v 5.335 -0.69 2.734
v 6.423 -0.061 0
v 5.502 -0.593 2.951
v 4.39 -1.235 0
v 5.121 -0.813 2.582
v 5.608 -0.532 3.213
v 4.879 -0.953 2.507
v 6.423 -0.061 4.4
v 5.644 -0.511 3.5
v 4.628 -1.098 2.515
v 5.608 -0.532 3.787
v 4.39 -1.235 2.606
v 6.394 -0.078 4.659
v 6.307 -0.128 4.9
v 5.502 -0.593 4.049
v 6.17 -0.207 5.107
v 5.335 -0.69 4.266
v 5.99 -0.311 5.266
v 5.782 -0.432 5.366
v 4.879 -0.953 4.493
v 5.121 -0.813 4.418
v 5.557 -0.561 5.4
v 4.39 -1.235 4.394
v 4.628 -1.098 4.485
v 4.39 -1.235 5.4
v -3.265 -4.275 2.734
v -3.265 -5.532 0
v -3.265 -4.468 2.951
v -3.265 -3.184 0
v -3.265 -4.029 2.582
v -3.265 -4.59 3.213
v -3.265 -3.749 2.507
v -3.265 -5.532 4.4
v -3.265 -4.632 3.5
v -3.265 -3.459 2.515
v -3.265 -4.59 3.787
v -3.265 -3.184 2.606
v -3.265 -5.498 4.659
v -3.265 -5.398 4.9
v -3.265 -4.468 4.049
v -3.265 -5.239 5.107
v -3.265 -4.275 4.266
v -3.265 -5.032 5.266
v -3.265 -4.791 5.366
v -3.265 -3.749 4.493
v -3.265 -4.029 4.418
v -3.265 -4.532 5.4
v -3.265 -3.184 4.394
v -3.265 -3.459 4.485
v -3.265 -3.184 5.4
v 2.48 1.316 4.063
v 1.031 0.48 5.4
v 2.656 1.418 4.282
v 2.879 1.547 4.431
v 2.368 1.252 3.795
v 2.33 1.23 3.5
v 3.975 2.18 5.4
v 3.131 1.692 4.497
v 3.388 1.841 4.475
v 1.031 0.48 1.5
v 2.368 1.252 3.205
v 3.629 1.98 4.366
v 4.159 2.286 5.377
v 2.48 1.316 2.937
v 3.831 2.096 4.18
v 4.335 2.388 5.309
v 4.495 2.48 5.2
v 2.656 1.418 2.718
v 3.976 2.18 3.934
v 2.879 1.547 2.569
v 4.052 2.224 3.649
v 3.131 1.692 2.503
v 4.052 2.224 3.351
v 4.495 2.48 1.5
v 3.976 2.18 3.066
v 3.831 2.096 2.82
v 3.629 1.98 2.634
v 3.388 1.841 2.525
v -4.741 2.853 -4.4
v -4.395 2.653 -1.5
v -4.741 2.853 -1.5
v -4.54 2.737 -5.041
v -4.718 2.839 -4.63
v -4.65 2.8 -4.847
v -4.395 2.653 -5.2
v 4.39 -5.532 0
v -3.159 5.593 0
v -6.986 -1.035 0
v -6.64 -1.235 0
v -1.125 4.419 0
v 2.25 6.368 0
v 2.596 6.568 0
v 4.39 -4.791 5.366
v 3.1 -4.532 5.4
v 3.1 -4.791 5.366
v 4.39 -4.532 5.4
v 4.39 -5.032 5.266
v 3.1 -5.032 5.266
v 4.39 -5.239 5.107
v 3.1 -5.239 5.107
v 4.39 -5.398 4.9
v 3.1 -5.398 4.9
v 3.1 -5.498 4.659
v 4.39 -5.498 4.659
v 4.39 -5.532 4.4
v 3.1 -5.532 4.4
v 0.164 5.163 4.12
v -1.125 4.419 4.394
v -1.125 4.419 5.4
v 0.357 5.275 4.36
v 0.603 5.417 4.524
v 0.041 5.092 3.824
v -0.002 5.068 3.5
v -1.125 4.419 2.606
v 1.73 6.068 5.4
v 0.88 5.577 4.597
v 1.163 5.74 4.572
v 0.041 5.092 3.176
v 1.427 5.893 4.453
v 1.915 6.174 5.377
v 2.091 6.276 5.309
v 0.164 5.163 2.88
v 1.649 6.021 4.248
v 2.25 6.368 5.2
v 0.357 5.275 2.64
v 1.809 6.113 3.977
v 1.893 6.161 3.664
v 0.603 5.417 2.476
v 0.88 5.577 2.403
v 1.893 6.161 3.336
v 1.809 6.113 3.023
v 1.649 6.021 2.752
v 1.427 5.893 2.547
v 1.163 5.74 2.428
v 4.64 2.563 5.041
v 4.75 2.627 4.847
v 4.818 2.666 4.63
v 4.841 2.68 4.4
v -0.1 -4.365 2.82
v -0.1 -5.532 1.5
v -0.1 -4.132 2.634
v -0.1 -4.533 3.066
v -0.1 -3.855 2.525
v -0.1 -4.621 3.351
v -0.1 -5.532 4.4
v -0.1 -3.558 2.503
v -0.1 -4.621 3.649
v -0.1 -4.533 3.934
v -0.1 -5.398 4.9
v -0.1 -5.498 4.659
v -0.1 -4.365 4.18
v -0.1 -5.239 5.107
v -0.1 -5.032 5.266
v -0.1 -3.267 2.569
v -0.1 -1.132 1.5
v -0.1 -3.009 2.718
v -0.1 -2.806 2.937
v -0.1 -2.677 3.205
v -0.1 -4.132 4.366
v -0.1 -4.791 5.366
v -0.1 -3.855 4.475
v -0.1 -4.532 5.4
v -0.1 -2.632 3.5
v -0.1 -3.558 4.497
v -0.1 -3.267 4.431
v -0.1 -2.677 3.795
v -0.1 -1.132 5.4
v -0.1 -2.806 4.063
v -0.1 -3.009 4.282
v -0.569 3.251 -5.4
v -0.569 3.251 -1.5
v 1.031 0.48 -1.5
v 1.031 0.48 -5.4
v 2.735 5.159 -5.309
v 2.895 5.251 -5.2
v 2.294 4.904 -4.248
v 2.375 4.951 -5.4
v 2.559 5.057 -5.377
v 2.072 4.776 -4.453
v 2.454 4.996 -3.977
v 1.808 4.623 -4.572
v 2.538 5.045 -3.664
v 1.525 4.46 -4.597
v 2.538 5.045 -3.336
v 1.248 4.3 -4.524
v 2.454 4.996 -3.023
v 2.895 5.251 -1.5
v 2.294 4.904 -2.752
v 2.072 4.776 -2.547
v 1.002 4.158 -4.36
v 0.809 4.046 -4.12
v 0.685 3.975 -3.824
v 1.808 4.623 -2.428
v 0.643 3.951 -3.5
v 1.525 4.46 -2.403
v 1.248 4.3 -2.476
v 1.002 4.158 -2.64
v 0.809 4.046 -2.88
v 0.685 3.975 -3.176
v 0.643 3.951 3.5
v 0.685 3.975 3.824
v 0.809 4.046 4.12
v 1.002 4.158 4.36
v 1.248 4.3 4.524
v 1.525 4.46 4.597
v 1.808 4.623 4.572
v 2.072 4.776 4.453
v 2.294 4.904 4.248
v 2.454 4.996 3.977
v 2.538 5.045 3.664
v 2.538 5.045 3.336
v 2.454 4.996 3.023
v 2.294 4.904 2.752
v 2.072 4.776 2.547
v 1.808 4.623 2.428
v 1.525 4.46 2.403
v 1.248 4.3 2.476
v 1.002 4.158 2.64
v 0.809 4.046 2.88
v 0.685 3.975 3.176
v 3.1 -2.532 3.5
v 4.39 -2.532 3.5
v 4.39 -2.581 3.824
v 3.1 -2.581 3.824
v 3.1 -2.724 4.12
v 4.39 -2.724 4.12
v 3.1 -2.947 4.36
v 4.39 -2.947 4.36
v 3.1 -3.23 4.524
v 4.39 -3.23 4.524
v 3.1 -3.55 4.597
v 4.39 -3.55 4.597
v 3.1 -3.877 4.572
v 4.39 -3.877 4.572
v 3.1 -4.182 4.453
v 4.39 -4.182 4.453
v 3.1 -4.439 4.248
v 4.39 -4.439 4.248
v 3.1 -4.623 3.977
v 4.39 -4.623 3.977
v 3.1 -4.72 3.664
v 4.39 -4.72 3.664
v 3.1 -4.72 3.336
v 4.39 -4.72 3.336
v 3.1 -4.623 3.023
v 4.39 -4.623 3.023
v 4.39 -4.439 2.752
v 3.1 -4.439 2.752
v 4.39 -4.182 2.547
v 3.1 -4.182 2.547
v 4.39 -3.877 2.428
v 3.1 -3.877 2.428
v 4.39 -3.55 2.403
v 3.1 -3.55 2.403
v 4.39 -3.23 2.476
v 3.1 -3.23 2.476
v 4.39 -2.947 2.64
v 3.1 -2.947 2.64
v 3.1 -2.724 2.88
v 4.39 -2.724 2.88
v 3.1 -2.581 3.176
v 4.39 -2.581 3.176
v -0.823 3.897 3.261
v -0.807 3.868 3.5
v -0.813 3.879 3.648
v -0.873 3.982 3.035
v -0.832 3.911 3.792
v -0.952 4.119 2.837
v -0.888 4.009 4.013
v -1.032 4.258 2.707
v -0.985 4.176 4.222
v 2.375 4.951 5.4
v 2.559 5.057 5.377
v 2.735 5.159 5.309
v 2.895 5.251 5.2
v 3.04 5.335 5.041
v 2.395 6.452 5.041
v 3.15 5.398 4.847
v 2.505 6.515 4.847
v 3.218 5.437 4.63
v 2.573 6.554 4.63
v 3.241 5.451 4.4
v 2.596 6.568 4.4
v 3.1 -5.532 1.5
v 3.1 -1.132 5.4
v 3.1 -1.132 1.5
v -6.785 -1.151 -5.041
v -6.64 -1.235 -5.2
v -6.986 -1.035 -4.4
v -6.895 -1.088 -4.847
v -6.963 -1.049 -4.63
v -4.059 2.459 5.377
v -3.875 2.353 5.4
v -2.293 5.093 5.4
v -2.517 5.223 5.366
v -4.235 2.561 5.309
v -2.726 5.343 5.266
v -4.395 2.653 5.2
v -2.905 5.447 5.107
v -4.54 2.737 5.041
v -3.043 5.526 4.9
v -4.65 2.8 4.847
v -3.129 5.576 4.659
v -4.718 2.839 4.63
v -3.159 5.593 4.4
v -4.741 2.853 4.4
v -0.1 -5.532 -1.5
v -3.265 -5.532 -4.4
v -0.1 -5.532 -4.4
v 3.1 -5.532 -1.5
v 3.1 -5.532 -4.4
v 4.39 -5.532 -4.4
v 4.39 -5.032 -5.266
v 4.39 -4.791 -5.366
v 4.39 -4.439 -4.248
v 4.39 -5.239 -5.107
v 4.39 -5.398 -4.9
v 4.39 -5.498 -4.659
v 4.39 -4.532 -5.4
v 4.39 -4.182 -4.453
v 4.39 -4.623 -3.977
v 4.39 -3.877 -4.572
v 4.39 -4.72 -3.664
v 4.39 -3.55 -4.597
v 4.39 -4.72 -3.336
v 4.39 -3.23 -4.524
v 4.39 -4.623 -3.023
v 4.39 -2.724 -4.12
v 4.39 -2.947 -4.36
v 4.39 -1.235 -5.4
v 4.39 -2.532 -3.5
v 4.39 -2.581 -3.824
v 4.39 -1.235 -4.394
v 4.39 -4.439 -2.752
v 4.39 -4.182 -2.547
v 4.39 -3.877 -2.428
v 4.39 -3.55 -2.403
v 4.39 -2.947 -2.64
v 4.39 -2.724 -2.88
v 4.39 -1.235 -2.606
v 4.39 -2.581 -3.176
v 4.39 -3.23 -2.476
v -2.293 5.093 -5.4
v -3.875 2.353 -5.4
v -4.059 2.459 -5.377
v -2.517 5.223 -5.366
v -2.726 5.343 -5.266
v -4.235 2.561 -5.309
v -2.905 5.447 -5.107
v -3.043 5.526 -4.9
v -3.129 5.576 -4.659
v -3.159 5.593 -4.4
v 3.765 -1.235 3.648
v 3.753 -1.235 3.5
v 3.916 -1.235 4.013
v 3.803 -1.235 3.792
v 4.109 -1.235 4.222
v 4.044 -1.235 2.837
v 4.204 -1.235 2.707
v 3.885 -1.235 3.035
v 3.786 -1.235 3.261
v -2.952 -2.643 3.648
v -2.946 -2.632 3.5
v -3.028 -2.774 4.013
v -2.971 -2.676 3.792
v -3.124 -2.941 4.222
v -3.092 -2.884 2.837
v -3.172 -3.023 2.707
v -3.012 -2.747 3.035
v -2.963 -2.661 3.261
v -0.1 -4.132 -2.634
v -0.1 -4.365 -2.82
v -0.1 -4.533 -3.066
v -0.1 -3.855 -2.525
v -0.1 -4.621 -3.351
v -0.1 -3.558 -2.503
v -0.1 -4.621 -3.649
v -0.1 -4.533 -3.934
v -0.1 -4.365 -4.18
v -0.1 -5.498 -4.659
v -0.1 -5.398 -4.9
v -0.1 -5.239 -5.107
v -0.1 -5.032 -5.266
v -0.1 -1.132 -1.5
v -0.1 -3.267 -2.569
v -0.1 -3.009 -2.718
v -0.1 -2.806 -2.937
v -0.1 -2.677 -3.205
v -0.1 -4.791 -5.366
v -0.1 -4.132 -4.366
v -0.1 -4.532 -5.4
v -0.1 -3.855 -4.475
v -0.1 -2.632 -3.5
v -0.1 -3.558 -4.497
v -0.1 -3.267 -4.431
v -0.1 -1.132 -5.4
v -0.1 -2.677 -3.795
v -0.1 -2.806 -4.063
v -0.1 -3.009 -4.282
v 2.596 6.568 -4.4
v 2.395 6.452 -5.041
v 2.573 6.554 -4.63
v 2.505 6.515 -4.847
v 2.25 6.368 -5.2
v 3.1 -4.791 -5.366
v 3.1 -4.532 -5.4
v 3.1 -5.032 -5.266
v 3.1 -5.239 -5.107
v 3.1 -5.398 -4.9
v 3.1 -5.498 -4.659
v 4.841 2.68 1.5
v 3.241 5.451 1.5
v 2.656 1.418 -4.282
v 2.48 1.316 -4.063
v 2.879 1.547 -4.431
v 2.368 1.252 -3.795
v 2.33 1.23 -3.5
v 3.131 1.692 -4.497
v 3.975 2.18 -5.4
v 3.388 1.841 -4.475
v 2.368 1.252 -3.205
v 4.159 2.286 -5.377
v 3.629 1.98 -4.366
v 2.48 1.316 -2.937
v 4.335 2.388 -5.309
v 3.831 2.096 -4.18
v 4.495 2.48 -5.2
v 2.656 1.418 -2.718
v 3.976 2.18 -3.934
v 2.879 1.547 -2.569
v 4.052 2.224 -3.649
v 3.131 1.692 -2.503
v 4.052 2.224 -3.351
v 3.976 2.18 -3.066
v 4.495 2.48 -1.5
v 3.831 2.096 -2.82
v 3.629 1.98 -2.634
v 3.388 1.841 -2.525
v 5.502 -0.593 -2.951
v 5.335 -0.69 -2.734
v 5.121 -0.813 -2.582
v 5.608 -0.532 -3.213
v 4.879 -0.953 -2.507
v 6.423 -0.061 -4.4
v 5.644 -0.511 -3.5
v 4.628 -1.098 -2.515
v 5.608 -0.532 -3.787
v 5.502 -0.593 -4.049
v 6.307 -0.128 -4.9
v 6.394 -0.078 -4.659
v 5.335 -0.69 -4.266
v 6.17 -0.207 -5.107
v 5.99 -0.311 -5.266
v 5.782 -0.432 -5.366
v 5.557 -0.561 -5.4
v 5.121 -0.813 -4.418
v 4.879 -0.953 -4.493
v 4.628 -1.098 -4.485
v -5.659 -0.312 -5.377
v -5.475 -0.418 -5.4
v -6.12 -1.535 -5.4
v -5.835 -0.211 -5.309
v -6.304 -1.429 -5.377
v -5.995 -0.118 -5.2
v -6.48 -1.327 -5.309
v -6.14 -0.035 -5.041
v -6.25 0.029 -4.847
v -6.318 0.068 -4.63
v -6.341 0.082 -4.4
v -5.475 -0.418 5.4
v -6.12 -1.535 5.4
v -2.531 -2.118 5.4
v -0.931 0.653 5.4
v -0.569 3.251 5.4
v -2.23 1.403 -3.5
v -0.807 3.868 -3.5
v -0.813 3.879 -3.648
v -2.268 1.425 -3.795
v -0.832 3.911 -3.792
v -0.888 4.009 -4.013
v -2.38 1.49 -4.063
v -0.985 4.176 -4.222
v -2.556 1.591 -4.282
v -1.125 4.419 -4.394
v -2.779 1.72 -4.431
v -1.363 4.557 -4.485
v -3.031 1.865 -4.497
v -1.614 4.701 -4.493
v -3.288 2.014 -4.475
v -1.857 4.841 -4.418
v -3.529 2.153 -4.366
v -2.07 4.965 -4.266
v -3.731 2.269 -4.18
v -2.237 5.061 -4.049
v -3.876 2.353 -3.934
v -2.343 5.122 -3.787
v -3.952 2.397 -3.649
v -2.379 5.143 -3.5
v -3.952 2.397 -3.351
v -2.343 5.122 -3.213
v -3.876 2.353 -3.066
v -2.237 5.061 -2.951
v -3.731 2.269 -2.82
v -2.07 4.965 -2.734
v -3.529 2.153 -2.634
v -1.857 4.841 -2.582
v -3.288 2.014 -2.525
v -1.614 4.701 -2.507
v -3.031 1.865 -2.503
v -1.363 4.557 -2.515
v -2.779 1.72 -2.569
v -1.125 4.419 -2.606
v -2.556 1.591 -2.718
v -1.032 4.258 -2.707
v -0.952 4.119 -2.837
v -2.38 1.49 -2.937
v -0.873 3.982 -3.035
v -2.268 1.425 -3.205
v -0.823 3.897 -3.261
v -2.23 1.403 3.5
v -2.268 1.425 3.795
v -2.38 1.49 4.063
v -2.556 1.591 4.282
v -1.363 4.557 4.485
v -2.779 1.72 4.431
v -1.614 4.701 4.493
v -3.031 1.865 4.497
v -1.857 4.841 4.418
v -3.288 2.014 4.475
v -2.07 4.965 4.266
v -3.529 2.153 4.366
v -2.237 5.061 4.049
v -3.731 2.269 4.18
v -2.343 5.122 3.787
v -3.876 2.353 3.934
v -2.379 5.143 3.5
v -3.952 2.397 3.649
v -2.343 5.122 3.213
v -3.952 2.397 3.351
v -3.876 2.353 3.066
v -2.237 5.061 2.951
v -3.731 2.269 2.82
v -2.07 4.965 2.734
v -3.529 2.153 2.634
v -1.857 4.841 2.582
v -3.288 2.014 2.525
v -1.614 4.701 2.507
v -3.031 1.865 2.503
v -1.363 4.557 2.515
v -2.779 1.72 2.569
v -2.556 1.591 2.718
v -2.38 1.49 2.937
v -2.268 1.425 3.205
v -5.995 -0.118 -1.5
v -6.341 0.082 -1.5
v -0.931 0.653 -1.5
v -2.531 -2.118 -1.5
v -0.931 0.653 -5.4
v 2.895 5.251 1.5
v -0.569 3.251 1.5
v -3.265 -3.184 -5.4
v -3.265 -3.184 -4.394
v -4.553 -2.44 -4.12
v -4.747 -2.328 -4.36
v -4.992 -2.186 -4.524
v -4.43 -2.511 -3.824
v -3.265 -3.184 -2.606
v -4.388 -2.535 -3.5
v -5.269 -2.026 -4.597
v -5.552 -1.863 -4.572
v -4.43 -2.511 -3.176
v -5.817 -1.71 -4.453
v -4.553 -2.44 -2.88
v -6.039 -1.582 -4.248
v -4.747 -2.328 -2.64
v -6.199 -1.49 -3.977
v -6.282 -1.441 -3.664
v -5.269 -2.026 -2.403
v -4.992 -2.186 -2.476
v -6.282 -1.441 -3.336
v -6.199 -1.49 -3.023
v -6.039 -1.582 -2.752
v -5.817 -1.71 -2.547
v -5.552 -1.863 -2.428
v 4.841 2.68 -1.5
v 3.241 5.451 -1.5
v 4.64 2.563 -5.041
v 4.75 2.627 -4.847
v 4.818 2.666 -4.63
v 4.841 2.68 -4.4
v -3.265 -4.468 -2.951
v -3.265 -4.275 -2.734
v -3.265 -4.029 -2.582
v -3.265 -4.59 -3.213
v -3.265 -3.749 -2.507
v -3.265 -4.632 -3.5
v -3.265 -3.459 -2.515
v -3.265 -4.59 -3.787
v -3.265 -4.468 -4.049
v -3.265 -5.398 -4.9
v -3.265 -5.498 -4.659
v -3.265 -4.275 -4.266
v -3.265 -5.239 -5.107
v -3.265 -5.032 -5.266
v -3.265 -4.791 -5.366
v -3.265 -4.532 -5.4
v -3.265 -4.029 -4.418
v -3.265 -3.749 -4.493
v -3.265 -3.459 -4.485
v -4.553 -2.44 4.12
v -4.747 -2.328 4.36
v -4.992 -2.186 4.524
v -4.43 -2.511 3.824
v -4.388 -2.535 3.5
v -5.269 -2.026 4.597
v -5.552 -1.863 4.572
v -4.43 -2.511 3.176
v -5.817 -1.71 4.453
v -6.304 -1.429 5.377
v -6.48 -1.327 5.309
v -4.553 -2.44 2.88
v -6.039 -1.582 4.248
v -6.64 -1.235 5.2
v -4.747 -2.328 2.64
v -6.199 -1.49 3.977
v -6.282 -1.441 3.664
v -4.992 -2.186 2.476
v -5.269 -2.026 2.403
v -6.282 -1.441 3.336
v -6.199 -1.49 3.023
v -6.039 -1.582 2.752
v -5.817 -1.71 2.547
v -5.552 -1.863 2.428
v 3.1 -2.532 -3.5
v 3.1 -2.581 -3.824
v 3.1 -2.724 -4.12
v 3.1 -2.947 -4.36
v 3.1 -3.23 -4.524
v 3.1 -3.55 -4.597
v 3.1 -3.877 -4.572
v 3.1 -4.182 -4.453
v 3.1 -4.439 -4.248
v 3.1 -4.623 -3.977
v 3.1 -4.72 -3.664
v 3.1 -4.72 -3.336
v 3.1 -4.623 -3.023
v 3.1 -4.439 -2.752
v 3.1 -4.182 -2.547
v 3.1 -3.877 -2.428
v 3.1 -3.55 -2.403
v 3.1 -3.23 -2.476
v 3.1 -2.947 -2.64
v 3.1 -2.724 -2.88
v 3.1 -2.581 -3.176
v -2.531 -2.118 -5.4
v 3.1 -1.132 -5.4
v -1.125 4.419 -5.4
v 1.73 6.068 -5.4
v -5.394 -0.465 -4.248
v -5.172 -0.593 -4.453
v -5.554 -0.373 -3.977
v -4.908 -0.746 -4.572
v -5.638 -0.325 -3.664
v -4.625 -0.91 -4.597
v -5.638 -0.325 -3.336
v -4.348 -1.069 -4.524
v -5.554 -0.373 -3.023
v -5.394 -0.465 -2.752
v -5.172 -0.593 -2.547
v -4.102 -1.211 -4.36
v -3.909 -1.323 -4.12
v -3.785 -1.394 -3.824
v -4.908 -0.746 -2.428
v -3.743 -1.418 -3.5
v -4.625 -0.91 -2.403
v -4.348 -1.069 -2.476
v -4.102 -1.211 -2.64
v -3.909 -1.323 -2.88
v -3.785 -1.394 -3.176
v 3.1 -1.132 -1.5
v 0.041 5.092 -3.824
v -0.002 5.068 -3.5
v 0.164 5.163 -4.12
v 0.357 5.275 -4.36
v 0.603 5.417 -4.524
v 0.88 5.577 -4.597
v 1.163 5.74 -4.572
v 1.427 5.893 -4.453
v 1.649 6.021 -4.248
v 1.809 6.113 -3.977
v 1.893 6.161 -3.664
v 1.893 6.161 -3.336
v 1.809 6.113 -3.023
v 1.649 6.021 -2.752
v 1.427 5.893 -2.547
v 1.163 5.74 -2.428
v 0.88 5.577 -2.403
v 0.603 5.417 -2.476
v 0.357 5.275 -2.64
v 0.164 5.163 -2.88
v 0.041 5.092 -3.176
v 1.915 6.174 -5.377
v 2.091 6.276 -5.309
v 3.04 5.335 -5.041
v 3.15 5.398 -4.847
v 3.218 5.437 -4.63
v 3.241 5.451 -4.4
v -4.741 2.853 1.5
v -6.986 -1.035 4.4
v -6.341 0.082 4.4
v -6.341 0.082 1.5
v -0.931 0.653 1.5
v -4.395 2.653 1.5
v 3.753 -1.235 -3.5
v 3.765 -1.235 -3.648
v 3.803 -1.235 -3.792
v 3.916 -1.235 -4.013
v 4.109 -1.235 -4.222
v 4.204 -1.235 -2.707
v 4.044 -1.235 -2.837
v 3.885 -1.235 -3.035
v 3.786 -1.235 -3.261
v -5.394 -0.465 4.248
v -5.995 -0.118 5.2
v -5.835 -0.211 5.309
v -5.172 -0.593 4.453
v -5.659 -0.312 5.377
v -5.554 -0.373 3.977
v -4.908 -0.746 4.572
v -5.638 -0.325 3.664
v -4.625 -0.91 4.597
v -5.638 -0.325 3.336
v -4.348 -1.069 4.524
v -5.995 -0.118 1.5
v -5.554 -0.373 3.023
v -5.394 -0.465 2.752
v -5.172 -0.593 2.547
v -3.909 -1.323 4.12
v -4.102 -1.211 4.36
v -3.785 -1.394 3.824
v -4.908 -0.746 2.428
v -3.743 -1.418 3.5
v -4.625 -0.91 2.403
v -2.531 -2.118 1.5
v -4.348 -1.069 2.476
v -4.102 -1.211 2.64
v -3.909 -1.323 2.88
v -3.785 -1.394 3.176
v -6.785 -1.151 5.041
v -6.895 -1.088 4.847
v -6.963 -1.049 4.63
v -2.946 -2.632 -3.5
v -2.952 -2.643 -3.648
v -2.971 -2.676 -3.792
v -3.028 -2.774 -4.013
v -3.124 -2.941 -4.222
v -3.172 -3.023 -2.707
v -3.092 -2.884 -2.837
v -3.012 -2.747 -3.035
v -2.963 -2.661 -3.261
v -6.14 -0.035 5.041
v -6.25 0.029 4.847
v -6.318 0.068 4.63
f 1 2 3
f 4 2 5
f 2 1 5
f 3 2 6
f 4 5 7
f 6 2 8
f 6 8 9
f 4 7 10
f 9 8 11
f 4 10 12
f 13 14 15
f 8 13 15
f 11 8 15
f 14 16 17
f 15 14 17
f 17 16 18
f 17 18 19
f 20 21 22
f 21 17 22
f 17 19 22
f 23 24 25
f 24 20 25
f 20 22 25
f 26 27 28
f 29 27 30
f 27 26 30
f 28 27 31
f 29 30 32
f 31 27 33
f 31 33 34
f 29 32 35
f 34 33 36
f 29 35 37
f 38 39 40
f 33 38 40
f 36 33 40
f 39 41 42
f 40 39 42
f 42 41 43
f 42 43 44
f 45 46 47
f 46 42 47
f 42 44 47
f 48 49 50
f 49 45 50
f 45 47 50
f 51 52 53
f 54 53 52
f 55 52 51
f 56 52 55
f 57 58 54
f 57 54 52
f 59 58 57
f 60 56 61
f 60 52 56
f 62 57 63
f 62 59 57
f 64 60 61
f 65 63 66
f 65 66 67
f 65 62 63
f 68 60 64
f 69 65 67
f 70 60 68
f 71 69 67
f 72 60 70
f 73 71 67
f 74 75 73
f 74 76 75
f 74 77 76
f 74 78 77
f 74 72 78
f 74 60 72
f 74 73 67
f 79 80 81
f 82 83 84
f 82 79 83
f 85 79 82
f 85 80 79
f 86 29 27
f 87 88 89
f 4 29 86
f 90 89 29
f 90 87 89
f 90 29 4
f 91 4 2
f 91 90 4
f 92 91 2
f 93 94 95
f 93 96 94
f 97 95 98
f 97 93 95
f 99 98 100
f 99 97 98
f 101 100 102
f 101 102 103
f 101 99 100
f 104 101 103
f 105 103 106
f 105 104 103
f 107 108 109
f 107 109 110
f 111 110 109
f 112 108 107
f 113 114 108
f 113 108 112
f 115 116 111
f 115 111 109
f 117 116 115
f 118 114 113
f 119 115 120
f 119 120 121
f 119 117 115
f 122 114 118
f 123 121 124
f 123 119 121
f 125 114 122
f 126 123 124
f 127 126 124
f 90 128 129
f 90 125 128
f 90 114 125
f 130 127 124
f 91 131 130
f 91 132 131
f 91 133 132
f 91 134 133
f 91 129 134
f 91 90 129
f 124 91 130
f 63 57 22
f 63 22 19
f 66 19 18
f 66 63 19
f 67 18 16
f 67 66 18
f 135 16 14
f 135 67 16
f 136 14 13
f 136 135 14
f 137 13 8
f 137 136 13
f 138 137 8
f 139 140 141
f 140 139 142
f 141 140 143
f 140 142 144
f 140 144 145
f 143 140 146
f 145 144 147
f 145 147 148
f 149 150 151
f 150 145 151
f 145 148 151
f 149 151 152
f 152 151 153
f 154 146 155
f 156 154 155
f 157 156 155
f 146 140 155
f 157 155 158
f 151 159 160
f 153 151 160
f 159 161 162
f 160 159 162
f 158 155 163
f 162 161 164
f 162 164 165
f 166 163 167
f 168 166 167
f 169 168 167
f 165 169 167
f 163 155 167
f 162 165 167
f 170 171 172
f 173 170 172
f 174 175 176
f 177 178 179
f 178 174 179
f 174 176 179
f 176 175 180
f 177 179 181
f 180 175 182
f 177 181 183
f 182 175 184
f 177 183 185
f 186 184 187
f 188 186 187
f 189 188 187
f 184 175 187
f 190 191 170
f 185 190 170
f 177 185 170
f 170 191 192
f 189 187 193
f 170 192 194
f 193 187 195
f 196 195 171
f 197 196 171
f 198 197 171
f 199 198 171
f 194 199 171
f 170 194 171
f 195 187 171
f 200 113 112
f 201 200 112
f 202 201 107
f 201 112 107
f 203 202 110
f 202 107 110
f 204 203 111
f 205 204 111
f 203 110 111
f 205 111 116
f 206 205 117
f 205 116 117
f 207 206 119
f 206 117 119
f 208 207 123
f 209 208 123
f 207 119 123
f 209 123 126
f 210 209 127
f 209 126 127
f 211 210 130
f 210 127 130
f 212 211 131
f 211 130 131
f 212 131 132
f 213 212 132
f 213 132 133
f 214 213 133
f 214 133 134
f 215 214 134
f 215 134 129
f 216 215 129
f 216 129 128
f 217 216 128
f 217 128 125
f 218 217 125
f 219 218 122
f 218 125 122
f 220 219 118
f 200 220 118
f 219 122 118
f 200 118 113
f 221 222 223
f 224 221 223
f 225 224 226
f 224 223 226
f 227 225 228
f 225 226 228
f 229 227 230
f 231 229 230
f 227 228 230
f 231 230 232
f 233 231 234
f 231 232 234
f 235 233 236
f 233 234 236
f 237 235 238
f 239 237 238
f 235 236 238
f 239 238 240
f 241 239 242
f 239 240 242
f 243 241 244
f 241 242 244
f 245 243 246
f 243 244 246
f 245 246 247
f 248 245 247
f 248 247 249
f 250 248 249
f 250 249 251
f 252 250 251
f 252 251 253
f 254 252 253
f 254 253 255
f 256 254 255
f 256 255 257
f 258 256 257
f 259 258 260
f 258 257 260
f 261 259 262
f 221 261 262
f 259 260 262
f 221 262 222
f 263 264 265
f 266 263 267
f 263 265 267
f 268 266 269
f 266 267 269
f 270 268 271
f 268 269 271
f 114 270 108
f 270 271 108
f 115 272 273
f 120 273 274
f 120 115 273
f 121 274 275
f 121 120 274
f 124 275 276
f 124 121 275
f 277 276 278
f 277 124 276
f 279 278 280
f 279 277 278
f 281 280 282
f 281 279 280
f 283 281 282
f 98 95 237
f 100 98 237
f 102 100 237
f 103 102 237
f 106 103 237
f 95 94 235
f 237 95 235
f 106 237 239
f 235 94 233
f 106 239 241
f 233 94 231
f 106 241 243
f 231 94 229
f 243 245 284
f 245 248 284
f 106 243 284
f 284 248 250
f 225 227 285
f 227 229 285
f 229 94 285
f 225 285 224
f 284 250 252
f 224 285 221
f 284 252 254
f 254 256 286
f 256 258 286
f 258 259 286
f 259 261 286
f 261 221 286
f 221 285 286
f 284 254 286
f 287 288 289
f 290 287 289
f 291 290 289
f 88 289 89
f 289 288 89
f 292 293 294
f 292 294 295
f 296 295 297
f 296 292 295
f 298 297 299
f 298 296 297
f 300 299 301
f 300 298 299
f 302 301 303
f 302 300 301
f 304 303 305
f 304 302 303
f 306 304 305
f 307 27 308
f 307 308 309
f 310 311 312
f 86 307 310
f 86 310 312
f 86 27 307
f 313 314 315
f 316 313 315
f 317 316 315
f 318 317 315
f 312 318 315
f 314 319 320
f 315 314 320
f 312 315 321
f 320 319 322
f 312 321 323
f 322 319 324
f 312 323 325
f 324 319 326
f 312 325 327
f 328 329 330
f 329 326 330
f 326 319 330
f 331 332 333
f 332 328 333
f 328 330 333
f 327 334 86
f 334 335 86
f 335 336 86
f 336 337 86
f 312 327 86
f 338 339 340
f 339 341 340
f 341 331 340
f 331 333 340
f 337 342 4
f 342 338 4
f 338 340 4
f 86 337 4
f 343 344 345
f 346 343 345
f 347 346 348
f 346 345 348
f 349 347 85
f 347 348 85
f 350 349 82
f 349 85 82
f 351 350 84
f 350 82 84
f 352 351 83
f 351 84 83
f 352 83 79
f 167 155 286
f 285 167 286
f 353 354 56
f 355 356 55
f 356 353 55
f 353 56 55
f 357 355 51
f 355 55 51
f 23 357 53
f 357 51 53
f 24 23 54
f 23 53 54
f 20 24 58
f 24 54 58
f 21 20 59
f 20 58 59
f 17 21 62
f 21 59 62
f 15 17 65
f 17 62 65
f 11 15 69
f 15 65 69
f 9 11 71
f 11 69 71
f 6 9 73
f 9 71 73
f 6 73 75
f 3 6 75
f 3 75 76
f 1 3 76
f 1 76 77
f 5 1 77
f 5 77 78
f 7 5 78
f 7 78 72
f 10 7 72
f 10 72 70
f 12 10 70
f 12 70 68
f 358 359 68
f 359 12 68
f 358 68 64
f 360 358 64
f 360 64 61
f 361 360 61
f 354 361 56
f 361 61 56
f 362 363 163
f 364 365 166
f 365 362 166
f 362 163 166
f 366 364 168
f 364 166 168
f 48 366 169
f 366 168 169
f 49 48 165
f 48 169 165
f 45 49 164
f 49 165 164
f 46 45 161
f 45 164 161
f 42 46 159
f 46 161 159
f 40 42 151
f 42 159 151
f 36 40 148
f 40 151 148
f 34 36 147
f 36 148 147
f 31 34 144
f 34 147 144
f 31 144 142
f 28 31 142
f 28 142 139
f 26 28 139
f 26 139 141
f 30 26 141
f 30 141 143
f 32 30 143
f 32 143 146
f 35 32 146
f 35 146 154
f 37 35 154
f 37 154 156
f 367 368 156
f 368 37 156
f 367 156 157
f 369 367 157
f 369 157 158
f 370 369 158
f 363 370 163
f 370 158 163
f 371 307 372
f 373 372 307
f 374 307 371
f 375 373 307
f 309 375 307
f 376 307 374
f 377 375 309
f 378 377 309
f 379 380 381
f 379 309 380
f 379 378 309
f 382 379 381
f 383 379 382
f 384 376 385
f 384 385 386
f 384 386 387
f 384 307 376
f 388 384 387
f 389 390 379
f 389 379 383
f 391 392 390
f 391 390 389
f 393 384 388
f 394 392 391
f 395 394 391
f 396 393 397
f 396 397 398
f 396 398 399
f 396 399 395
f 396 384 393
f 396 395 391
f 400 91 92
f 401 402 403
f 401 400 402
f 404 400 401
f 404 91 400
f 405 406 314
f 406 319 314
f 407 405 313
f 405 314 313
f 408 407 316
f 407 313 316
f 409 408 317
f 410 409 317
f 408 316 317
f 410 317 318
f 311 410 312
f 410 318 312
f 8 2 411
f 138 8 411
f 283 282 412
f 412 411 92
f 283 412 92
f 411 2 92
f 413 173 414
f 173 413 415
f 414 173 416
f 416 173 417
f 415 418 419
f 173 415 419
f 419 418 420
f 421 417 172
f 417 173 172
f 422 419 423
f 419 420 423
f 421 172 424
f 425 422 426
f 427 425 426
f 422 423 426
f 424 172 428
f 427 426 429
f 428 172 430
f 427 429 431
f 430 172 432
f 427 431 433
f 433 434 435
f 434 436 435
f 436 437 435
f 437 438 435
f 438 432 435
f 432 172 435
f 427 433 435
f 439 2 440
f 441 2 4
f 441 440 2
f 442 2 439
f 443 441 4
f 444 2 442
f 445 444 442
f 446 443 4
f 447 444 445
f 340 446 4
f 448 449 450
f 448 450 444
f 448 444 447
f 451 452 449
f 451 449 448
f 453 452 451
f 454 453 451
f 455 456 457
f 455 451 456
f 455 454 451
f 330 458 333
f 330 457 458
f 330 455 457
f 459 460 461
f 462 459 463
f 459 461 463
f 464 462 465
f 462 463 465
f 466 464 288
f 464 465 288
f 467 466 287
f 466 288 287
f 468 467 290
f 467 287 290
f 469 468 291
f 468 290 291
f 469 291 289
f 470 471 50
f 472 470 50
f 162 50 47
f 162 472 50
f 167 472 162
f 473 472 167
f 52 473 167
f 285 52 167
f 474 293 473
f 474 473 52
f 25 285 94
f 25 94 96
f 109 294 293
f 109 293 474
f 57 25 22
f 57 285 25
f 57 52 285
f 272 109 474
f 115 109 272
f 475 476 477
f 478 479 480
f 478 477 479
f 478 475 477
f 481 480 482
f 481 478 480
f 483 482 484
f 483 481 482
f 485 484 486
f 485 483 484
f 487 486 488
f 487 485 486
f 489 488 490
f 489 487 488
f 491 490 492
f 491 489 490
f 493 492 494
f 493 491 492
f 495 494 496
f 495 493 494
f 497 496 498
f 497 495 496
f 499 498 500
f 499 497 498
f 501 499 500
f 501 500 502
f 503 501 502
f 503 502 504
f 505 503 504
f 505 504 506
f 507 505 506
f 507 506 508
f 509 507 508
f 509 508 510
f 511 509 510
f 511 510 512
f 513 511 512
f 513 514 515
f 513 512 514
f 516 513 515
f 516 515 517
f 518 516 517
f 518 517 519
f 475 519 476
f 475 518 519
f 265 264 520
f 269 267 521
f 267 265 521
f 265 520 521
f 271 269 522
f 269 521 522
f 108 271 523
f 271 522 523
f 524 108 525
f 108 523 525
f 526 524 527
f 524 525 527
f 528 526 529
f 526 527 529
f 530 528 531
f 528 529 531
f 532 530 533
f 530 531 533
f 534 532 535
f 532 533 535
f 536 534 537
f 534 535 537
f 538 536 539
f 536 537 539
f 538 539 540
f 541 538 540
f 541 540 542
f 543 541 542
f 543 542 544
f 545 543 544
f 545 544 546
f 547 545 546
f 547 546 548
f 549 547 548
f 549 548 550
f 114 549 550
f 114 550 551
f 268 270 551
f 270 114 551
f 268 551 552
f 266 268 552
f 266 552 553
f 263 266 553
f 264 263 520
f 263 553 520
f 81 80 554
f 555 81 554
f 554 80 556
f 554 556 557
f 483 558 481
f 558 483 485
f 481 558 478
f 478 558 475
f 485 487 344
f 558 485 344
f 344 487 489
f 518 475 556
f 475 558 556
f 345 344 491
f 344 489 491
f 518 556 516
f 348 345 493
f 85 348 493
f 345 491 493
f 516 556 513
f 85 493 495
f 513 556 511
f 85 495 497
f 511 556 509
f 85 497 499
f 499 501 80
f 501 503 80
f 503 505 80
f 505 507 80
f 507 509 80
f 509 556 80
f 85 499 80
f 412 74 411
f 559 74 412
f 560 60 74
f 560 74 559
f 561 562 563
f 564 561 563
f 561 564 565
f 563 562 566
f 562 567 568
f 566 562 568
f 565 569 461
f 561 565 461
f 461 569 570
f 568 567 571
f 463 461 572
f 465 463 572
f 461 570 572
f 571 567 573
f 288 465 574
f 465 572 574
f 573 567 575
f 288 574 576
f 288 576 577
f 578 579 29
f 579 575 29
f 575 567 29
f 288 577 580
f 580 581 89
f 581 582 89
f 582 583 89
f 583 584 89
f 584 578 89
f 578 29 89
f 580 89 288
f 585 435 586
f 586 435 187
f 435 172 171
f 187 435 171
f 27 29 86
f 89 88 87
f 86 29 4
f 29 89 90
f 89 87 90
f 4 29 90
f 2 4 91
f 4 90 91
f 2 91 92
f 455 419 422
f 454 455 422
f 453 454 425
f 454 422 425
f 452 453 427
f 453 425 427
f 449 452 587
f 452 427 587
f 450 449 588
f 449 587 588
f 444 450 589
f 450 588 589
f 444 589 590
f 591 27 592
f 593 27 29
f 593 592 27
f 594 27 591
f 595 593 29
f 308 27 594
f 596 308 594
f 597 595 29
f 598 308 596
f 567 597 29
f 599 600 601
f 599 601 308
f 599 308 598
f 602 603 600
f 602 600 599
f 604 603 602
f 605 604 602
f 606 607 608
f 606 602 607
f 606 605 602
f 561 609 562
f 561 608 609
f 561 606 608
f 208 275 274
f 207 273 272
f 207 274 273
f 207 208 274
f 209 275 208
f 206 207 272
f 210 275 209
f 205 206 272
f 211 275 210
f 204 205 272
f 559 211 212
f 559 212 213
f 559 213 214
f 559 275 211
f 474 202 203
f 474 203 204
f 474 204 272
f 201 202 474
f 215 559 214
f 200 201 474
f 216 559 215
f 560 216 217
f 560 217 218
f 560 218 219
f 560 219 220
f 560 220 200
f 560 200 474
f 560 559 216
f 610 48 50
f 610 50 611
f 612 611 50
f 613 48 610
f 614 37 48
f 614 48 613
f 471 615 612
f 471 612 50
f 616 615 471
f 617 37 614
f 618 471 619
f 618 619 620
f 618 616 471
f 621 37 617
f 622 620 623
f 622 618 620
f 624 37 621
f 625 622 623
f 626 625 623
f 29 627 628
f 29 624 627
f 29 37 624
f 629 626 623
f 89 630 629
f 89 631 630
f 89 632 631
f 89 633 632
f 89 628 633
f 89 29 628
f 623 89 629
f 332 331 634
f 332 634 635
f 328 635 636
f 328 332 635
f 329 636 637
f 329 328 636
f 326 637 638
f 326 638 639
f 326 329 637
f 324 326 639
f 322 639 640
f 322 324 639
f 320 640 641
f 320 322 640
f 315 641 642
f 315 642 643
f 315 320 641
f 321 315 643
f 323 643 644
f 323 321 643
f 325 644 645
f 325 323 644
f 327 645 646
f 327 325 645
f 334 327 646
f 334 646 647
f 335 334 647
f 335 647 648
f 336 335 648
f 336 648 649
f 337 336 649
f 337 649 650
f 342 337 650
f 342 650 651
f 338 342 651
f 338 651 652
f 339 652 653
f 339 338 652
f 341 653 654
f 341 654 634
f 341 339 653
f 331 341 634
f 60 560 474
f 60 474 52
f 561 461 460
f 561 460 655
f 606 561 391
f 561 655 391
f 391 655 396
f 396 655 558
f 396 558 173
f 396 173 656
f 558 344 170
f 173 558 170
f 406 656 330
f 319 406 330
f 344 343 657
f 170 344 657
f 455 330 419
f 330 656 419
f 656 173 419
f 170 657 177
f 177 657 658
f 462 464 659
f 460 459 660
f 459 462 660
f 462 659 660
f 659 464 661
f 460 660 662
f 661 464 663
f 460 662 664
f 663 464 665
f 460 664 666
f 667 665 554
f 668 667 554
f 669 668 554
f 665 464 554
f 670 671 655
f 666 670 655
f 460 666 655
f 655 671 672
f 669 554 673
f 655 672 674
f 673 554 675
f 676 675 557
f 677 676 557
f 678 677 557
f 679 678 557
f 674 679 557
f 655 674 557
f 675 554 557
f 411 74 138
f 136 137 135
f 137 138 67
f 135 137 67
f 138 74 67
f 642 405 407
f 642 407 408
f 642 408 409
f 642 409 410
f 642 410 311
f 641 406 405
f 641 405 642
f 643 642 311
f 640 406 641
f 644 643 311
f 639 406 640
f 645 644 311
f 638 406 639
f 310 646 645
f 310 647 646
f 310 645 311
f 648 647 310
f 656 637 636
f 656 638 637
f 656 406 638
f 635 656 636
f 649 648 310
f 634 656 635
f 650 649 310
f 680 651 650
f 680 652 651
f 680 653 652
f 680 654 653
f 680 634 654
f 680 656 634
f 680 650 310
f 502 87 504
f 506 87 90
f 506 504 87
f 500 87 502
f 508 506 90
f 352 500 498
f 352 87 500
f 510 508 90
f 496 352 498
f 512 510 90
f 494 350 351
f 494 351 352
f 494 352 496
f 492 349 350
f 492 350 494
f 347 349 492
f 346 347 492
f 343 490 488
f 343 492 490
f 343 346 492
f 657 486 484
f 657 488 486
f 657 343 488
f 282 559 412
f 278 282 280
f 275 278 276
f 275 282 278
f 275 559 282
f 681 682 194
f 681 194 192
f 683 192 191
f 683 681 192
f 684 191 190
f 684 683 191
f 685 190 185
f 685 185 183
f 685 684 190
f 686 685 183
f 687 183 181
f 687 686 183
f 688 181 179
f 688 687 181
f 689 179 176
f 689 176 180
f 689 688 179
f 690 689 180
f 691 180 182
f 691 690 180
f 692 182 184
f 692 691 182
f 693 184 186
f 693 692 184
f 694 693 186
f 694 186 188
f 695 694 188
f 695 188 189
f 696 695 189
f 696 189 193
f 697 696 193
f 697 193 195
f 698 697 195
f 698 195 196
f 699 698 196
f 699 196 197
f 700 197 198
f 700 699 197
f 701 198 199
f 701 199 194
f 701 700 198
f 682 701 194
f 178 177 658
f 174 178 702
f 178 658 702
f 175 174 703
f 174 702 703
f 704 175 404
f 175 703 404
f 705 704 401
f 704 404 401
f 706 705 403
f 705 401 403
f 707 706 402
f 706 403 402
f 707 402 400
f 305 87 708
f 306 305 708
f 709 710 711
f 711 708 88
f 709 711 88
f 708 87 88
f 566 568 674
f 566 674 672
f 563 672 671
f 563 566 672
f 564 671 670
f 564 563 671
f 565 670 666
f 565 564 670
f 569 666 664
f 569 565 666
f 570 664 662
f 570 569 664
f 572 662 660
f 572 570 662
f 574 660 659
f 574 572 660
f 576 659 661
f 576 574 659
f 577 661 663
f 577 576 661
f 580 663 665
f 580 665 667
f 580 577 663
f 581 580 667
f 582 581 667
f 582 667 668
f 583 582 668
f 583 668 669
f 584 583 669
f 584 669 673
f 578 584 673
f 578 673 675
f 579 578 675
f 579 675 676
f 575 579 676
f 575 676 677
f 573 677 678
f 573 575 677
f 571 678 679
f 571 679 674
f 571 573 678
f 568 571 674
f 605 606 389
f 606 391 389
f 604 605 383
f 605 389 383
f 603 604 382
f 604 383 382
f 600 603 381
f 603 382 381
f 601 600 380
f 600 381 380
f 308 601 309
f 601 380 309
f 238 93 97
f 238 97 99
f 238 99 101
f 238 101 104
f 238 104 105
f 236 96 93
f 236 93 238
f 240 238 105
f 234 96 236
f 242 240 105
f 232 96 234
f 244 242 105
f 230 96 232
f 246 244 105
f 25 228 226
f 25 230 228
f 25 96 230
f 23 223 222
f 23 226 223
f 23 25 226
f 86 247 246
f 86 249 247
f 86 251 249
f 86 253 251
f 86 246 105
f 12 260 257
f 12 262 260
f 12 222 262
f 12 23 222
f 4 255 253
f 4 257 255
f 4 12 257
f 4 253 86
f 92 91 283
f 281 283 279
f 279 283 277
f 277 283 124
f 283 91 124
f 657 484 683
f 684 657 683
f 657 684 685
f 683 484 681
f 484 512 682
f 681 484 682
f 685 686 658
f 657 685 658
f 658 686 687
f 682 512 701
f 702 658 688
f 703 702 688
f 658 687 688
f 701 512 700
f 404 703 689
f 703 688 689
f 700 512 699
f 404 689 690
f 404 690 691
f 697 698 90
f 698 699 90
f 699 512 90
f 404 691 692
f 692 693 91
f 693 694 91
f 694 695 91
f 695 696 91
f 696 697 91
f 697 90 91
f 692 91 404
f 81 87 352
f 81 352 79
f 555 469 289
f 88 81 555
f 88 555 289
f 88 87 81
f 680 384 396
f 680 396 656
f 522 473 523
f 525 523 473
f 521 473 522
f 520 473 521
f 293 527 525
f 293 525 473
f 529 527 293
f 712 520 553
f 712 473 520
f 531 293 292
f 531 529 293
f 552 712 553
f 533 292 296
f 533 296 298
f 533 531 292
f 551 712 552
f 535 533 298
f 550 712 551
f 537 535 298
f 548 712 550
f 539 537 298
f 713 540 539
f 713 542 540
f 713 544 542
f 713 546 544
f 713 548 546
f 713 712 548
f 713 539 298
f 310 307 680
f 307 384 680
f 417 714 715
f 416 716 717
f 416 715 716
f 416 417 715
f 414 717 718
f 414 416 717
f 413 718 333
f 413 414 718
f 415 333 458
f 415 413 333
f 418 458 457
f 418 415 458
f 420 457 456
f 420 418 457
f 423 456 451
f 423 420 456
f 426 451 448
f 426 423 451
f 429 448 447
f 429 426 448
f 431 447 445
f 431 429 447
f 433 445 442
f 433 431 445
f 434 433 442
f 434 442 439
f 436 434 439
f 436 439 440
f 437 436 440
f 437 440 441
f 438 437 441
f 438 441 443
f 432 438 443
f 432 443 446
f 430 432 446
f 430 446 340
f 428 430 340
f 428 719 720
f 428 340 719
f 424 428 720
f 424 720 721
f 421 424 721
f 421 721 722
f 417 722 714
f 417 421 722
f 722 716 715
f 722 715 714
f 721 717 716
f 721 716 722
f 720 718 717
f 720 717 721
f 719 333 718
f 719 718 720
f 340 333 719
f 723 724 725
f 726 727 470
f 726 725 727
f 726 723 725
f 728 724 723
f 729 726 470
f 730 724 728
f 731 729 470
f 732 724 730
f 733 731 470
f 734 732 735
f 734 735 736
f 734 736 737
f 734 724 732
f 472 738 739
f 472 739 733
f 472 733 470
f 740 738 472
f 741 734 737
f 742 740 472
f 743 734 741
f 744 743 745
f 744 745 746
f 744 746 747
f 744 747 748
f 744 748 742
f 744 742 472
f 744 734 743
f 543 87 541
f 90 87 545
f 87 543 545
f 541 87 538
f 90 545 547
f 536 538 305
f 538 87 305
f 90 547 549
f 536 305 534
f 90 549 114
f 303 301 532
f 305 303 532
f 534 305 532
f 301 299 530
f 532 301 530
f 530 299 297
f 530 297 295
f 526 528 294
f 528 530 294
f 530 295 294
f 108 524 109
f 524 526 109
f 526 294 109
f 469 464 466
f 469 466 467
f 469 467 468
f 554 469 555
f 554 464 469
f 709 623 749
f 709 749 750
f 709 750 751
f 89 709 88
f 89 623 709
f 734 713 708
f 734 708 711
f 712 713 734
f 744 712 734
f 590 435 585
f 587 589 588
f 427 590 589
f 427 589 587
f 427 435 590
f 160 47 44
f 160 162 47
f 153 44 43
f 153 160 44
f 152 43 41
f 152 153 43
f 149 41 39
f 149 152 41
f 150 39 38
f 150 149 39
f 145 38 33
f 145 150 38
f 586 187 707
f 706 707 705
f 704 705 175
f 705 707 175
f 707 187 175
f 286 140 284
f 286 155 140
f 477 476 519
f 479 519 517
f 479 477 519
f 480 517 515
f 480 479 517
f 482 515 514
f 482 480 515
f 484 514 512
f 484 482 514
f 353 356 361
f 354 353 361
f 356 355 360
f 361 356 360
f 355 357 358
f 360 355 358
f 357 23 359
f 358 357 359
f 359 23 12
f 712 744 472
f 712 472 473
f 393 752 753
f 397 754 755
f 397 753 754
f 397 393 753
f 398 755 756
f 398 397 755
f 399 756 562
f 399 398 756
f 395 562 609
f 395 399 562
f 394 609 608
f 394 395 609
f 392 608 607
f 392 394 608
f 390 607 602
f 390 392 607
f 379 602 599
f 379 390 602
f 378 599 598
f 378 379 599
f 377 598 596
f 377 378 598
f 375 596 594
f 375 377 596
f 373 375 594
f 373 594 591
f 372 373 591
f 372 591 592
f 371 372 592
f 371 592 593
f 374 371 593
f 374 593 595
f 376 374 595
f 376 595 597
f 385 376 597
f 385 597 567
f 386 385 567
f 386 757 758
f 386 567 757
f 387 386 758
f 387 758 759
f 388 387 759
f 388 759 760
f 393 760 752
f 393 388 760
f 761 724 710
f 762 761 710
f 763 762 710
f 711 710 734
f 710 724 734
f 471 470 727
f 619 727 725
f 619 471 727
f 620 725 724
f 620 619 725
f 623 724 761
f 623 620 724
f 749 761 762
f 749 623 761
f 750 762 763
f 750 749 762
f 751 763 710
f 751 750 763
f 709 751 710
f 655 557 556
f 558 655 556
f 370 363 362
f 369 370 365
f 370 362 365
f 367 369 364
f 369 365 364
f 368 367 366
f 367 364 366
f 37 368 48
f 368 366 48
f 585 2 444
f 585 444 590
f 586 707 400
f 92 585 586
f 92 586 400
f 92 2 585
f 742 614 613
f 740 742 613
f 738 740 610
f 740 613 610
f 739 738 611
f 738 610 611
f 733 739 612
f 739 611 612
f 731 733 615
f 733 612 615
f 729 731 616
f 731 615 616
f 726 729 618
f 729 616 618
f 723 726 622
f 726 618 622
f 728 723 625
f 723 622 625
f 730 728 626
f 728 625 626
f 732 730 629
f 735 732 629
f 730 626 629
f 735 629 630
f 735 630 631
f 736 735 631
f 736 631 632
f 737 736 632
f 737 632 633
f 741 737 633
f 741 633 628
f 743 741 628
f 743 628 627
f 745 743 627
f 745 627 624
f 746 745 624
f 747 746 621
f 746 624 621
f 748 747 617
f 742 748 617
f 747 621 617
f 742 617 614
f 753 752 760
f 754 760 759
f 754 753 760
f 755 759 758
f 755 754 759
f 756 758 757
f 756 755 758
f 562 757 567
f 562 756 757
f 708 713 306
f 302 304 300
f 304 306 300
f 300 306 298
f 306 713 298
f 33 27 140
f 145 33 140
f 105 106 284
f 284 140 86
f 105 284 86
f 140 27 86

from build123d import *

# Parameters (mm, degrees)
F1_DEPTH  = 5
F2_W      = 3.2
F2_H      = 4
F3_DEPTH  = 3.5
F4_W      = 2.25
F4_H      = 3.897114317
F5_DEPTH  = 5
F6_R      = 1.1
F8_DEPTH  = 1.2895280957
F7_R      = 1.1
F10_DEPTH = 1.2895280957
F9_R      = 1.1
F11_DEPTH = 1.2895280957
F12_R     = 1
F15_REACH = 9.3689552204
F13_R     = 1
F16_REACH = 10.4939552204
F14_R     = 1
F17_REACH = 11.5637192683
F18_DEPTH = 0.4
F19_DEPTH = 0.4
F20_DEPTH = 0.4
F21_DEPTH = 0.4
F22_W     = 1.125
F22_H     = 2.3485571585
F23_DEPTH = 5.4
F24_R     = 1


with BuildPart() as f1:
    # F0 (on Top) → F1 (new body)
    with BuildSketch(Plane.XY):
        Polygon((2.25, 6.367628561), (-2.25, 6.367628561), (-6.6395280957, -1.235257122), (-4.3895280957, -5.132371439), (4.3895280957, -5.132371439), (6.6395280957, -1.235257122), align=None)
    extrude(amount=F1_DEPTH)

    # F2 (on face) → F3 (cut)
    with BuildSketch(Plane.XY.offset(5)):
        with Locations((1.5, -3.132371439)):
            Rectangle(F2_W, F2_H)
        Polygon((4.4947640478, 2.4795831791), (2.8947640478, 5.2508644712), (-0.5693375673, 3.2508644712), (1.0306624327, 0.4795831791), align=None)
        Polygon((-4.3947640478, 2.6527882599), (-5.9947640478, -0.1184930322), (-2.5306624327, -2.1184930322), (-0.9306624327, 0.6527882599), align=None)
    extrude(amount=-F3_DEPTH, mode=Mode.SUBTRACT)

    # F4 (on face) → F5 (cut, through all)
    with BuildSketch(Plane.XY.offset(5)):
        with Locations((5.5145280957, -3.1838142805)):
            Rectangle(F4_W, F4_H)
        Polygon((-1.125, 4.4190714025), (2.25, 6.367628561), (1.125, 8.3161857195), (-2.25, 6.367628561), align=None)
        Polygon((-3.2645280957, -3.1838142805), (-6.6395280957, -1.235257122), (-7.7645280957, -3.1838142805), (-4.3895280957, -5.132371439), align=None)
    extrude(amount=-F5_DEPTH, mode=Mode.SUBTRACT)

    # F6 (on face) → F8 (cut, through all)
    with BuildSketch(Plane(origin=(-2.1947640478, -3.8014428415, 0), x_dir=(0.8660254038, -0.5, 0), z_dir=(-0.5, -0.8660254038, 0))):
        with Locations((-3.632371439, 3.5)):
            Circle(F6_R)
    extrude(amount=-F8_DEPTH, mode=Mode.SUBTRACT)

    # F7 (on face) → F10 (cut, through all)
    with BuildSketch(Plane.YZ.offset(4.3895280957)):
        with Locations((-3.632371439, 3.5)):
            Circle(F7_R)
    extrude(amount=-F10_DEPTH, mode=Mode.SUBTRACT)

    # F9 (on face) → F11 (cut, through all)
    with BuildSketch(Plane(origin=(-2.1947640478, 3.8014428415, 0), x_dir=(-0.8660254038, -0.5, 0), z_dir=(-0.5, 0.8660254038, 0))):
        with Locations((-3.632371439, 3.5)):
            Circle(F9_R)
    extrude(amount=-F11_DEPTH, mode=Mode.SUBTRACT)

    f15_end = Plane(origin=(-3.8270280957, -4.1580928598, 2.5), x_dir=(-0.5, -0.8660254038, 0), z_dir=(-0.8660254038, 0.5, 0))
    # F12 (on face) → F15 (cut, up to a plane its end follows)
    with BuildSketch(Plane.YZ.offset(-0.1)):
        with Locations((-3.632371439, 3.5)):
            Circle(F12_R)
    f15_long = extrude(amount=-F15_REACH, mode=Mode.PRIVATE)
    add(split(f15_long, bisect_by=f15_end, keep=Keep.BOTTOM, mode=Mode.PRIVATE), mode=Mode.SUBTRACT)

    f16_end = Plane(origin=(5.5145280957, -1.235257122, 2.5), x_dir=(0, 0, -1), z_dir=(0, -1, 0))
    # F13 (on face) → F16 (cut, up to a plane its end follows)
    with BuildSketch(Plane(origin=(0.05, -0.0866025404, 0), x_dir=(-0.8660254038, -0.5, 0), z_dir=(-0.5, 0.8660254038, 0))):
        with Locations((-3.632371439, 3.5)):
            Circle(F13_R)
    f16_long = extrude(amount=-F16_REACH, mode=Mode.PRIVATE)
    add(split(f16_long, bisect_by=f16_end, keep=Keep.BOTTOM, mode=Mode.PRIVATE), mode=Mode.SUBTRACT)

    f17_end = Plane(origin=(-1.6875, 5.3933499817, 2.5), x_dir=(-0.5, 0.8660254038, 0), z_dir=(0.8660254038, 0.5, 0))
    # F14 (on face) → F17 (cut, up to a plane its end follows)
    with BuildSketch(Plane(origin=(0.05, 0.0866025404, 0), x_dir=(0.8660254038, -0.5, 0), z_dir=(-0.5, -0.8660254038, 0))):
        with Locations((-3.632371439, 3.5)):
            Circle(F14_R)
    f17_long = extrude(amount=-F17_REACH, mode=Mode.PRIVATE)
    add(split(f17_long, bisect_by=f17_end, keep=Keep.BOTTOM, mode=Mode.PRIVATE), mode=Mode.SUBTRACT)

    # F18 (add): a face of the model
    f18_faces = [f1.faces().sort_by_distance(p)[0] for p in [
        (0, 0, 5),
    ]]
    extrude(f18_faces, amount=F18_DEPTH)

    # F19 (add): a face of the model
    f19_faces = [f1.faces().sort_by_distance(p)[0] for p in [
        (4.7127523056, 2.1020164412, 2.4320117422),
    ]]
    extrude(f19_faces, amount=F19_DEPTH)

    # F20 (add): a face of the model
    f20_faces = [f1.faces().sort_by_distance(p)[0] for p in [
        (-4.1767757901, 3.0303549978, 2.4320117422),
    ]]
    extrude(f20_faces, amount=F20_DEPTH)

    # F21 (add): a face of the model
    f21_faces = [f1.faces().sort_by_distance(p)[0] for p in [
        (-0.5359765155, -5.132371439, 2.4320117422),
    ]]
    extrude(f21_faces, amount=F21_DEPTH)

    # F22 (on face) → F23 (cut, through all)
    with BuildSketch(Plane.XY.offset(5.4)):
        with Locations((-3.8270280957, -4.3580928598)):
            Rectangle(F22_W, F22_H)
        Polygon((6.4234382572, -0.0609785427), (4.3895280957, -1.235257122), (4.9520280957, -2.2095357012), (6.9859382572, -1.035257122), align=None)
        Polygon((-3.1589101615, 5.5933499817), (-1.125, 4.4190714025), (-0.5625, 5.3933499817), (-2.5964101615, 6.567628561), align=None)
    extrude(amount=-F23_DEPTH, mode=Mode.SUBTRACT)

    # F24
    f24_edges = [f1.edges().sort_by_distance(p)[0] for p in [
        (-1.682264, -5.532371, 5.4),
        (3.744764, -5.532371, 5.4),
        (5.632306, 1.309302, 5.4),
        (2.918792, 6.009247, 5.4),
        (-3.950042, 4.223069, 5.4),
        (-6.663556, -0.476875, 5.4),
    ]]
    fillet(f24_edges, radius=F24_R)


with BuildPart() as f25_1:
    # F25: instance of F1
    add(f1.part.mirror(Plane.XY))


solid = Compound([f1.part, f25_1.part])
